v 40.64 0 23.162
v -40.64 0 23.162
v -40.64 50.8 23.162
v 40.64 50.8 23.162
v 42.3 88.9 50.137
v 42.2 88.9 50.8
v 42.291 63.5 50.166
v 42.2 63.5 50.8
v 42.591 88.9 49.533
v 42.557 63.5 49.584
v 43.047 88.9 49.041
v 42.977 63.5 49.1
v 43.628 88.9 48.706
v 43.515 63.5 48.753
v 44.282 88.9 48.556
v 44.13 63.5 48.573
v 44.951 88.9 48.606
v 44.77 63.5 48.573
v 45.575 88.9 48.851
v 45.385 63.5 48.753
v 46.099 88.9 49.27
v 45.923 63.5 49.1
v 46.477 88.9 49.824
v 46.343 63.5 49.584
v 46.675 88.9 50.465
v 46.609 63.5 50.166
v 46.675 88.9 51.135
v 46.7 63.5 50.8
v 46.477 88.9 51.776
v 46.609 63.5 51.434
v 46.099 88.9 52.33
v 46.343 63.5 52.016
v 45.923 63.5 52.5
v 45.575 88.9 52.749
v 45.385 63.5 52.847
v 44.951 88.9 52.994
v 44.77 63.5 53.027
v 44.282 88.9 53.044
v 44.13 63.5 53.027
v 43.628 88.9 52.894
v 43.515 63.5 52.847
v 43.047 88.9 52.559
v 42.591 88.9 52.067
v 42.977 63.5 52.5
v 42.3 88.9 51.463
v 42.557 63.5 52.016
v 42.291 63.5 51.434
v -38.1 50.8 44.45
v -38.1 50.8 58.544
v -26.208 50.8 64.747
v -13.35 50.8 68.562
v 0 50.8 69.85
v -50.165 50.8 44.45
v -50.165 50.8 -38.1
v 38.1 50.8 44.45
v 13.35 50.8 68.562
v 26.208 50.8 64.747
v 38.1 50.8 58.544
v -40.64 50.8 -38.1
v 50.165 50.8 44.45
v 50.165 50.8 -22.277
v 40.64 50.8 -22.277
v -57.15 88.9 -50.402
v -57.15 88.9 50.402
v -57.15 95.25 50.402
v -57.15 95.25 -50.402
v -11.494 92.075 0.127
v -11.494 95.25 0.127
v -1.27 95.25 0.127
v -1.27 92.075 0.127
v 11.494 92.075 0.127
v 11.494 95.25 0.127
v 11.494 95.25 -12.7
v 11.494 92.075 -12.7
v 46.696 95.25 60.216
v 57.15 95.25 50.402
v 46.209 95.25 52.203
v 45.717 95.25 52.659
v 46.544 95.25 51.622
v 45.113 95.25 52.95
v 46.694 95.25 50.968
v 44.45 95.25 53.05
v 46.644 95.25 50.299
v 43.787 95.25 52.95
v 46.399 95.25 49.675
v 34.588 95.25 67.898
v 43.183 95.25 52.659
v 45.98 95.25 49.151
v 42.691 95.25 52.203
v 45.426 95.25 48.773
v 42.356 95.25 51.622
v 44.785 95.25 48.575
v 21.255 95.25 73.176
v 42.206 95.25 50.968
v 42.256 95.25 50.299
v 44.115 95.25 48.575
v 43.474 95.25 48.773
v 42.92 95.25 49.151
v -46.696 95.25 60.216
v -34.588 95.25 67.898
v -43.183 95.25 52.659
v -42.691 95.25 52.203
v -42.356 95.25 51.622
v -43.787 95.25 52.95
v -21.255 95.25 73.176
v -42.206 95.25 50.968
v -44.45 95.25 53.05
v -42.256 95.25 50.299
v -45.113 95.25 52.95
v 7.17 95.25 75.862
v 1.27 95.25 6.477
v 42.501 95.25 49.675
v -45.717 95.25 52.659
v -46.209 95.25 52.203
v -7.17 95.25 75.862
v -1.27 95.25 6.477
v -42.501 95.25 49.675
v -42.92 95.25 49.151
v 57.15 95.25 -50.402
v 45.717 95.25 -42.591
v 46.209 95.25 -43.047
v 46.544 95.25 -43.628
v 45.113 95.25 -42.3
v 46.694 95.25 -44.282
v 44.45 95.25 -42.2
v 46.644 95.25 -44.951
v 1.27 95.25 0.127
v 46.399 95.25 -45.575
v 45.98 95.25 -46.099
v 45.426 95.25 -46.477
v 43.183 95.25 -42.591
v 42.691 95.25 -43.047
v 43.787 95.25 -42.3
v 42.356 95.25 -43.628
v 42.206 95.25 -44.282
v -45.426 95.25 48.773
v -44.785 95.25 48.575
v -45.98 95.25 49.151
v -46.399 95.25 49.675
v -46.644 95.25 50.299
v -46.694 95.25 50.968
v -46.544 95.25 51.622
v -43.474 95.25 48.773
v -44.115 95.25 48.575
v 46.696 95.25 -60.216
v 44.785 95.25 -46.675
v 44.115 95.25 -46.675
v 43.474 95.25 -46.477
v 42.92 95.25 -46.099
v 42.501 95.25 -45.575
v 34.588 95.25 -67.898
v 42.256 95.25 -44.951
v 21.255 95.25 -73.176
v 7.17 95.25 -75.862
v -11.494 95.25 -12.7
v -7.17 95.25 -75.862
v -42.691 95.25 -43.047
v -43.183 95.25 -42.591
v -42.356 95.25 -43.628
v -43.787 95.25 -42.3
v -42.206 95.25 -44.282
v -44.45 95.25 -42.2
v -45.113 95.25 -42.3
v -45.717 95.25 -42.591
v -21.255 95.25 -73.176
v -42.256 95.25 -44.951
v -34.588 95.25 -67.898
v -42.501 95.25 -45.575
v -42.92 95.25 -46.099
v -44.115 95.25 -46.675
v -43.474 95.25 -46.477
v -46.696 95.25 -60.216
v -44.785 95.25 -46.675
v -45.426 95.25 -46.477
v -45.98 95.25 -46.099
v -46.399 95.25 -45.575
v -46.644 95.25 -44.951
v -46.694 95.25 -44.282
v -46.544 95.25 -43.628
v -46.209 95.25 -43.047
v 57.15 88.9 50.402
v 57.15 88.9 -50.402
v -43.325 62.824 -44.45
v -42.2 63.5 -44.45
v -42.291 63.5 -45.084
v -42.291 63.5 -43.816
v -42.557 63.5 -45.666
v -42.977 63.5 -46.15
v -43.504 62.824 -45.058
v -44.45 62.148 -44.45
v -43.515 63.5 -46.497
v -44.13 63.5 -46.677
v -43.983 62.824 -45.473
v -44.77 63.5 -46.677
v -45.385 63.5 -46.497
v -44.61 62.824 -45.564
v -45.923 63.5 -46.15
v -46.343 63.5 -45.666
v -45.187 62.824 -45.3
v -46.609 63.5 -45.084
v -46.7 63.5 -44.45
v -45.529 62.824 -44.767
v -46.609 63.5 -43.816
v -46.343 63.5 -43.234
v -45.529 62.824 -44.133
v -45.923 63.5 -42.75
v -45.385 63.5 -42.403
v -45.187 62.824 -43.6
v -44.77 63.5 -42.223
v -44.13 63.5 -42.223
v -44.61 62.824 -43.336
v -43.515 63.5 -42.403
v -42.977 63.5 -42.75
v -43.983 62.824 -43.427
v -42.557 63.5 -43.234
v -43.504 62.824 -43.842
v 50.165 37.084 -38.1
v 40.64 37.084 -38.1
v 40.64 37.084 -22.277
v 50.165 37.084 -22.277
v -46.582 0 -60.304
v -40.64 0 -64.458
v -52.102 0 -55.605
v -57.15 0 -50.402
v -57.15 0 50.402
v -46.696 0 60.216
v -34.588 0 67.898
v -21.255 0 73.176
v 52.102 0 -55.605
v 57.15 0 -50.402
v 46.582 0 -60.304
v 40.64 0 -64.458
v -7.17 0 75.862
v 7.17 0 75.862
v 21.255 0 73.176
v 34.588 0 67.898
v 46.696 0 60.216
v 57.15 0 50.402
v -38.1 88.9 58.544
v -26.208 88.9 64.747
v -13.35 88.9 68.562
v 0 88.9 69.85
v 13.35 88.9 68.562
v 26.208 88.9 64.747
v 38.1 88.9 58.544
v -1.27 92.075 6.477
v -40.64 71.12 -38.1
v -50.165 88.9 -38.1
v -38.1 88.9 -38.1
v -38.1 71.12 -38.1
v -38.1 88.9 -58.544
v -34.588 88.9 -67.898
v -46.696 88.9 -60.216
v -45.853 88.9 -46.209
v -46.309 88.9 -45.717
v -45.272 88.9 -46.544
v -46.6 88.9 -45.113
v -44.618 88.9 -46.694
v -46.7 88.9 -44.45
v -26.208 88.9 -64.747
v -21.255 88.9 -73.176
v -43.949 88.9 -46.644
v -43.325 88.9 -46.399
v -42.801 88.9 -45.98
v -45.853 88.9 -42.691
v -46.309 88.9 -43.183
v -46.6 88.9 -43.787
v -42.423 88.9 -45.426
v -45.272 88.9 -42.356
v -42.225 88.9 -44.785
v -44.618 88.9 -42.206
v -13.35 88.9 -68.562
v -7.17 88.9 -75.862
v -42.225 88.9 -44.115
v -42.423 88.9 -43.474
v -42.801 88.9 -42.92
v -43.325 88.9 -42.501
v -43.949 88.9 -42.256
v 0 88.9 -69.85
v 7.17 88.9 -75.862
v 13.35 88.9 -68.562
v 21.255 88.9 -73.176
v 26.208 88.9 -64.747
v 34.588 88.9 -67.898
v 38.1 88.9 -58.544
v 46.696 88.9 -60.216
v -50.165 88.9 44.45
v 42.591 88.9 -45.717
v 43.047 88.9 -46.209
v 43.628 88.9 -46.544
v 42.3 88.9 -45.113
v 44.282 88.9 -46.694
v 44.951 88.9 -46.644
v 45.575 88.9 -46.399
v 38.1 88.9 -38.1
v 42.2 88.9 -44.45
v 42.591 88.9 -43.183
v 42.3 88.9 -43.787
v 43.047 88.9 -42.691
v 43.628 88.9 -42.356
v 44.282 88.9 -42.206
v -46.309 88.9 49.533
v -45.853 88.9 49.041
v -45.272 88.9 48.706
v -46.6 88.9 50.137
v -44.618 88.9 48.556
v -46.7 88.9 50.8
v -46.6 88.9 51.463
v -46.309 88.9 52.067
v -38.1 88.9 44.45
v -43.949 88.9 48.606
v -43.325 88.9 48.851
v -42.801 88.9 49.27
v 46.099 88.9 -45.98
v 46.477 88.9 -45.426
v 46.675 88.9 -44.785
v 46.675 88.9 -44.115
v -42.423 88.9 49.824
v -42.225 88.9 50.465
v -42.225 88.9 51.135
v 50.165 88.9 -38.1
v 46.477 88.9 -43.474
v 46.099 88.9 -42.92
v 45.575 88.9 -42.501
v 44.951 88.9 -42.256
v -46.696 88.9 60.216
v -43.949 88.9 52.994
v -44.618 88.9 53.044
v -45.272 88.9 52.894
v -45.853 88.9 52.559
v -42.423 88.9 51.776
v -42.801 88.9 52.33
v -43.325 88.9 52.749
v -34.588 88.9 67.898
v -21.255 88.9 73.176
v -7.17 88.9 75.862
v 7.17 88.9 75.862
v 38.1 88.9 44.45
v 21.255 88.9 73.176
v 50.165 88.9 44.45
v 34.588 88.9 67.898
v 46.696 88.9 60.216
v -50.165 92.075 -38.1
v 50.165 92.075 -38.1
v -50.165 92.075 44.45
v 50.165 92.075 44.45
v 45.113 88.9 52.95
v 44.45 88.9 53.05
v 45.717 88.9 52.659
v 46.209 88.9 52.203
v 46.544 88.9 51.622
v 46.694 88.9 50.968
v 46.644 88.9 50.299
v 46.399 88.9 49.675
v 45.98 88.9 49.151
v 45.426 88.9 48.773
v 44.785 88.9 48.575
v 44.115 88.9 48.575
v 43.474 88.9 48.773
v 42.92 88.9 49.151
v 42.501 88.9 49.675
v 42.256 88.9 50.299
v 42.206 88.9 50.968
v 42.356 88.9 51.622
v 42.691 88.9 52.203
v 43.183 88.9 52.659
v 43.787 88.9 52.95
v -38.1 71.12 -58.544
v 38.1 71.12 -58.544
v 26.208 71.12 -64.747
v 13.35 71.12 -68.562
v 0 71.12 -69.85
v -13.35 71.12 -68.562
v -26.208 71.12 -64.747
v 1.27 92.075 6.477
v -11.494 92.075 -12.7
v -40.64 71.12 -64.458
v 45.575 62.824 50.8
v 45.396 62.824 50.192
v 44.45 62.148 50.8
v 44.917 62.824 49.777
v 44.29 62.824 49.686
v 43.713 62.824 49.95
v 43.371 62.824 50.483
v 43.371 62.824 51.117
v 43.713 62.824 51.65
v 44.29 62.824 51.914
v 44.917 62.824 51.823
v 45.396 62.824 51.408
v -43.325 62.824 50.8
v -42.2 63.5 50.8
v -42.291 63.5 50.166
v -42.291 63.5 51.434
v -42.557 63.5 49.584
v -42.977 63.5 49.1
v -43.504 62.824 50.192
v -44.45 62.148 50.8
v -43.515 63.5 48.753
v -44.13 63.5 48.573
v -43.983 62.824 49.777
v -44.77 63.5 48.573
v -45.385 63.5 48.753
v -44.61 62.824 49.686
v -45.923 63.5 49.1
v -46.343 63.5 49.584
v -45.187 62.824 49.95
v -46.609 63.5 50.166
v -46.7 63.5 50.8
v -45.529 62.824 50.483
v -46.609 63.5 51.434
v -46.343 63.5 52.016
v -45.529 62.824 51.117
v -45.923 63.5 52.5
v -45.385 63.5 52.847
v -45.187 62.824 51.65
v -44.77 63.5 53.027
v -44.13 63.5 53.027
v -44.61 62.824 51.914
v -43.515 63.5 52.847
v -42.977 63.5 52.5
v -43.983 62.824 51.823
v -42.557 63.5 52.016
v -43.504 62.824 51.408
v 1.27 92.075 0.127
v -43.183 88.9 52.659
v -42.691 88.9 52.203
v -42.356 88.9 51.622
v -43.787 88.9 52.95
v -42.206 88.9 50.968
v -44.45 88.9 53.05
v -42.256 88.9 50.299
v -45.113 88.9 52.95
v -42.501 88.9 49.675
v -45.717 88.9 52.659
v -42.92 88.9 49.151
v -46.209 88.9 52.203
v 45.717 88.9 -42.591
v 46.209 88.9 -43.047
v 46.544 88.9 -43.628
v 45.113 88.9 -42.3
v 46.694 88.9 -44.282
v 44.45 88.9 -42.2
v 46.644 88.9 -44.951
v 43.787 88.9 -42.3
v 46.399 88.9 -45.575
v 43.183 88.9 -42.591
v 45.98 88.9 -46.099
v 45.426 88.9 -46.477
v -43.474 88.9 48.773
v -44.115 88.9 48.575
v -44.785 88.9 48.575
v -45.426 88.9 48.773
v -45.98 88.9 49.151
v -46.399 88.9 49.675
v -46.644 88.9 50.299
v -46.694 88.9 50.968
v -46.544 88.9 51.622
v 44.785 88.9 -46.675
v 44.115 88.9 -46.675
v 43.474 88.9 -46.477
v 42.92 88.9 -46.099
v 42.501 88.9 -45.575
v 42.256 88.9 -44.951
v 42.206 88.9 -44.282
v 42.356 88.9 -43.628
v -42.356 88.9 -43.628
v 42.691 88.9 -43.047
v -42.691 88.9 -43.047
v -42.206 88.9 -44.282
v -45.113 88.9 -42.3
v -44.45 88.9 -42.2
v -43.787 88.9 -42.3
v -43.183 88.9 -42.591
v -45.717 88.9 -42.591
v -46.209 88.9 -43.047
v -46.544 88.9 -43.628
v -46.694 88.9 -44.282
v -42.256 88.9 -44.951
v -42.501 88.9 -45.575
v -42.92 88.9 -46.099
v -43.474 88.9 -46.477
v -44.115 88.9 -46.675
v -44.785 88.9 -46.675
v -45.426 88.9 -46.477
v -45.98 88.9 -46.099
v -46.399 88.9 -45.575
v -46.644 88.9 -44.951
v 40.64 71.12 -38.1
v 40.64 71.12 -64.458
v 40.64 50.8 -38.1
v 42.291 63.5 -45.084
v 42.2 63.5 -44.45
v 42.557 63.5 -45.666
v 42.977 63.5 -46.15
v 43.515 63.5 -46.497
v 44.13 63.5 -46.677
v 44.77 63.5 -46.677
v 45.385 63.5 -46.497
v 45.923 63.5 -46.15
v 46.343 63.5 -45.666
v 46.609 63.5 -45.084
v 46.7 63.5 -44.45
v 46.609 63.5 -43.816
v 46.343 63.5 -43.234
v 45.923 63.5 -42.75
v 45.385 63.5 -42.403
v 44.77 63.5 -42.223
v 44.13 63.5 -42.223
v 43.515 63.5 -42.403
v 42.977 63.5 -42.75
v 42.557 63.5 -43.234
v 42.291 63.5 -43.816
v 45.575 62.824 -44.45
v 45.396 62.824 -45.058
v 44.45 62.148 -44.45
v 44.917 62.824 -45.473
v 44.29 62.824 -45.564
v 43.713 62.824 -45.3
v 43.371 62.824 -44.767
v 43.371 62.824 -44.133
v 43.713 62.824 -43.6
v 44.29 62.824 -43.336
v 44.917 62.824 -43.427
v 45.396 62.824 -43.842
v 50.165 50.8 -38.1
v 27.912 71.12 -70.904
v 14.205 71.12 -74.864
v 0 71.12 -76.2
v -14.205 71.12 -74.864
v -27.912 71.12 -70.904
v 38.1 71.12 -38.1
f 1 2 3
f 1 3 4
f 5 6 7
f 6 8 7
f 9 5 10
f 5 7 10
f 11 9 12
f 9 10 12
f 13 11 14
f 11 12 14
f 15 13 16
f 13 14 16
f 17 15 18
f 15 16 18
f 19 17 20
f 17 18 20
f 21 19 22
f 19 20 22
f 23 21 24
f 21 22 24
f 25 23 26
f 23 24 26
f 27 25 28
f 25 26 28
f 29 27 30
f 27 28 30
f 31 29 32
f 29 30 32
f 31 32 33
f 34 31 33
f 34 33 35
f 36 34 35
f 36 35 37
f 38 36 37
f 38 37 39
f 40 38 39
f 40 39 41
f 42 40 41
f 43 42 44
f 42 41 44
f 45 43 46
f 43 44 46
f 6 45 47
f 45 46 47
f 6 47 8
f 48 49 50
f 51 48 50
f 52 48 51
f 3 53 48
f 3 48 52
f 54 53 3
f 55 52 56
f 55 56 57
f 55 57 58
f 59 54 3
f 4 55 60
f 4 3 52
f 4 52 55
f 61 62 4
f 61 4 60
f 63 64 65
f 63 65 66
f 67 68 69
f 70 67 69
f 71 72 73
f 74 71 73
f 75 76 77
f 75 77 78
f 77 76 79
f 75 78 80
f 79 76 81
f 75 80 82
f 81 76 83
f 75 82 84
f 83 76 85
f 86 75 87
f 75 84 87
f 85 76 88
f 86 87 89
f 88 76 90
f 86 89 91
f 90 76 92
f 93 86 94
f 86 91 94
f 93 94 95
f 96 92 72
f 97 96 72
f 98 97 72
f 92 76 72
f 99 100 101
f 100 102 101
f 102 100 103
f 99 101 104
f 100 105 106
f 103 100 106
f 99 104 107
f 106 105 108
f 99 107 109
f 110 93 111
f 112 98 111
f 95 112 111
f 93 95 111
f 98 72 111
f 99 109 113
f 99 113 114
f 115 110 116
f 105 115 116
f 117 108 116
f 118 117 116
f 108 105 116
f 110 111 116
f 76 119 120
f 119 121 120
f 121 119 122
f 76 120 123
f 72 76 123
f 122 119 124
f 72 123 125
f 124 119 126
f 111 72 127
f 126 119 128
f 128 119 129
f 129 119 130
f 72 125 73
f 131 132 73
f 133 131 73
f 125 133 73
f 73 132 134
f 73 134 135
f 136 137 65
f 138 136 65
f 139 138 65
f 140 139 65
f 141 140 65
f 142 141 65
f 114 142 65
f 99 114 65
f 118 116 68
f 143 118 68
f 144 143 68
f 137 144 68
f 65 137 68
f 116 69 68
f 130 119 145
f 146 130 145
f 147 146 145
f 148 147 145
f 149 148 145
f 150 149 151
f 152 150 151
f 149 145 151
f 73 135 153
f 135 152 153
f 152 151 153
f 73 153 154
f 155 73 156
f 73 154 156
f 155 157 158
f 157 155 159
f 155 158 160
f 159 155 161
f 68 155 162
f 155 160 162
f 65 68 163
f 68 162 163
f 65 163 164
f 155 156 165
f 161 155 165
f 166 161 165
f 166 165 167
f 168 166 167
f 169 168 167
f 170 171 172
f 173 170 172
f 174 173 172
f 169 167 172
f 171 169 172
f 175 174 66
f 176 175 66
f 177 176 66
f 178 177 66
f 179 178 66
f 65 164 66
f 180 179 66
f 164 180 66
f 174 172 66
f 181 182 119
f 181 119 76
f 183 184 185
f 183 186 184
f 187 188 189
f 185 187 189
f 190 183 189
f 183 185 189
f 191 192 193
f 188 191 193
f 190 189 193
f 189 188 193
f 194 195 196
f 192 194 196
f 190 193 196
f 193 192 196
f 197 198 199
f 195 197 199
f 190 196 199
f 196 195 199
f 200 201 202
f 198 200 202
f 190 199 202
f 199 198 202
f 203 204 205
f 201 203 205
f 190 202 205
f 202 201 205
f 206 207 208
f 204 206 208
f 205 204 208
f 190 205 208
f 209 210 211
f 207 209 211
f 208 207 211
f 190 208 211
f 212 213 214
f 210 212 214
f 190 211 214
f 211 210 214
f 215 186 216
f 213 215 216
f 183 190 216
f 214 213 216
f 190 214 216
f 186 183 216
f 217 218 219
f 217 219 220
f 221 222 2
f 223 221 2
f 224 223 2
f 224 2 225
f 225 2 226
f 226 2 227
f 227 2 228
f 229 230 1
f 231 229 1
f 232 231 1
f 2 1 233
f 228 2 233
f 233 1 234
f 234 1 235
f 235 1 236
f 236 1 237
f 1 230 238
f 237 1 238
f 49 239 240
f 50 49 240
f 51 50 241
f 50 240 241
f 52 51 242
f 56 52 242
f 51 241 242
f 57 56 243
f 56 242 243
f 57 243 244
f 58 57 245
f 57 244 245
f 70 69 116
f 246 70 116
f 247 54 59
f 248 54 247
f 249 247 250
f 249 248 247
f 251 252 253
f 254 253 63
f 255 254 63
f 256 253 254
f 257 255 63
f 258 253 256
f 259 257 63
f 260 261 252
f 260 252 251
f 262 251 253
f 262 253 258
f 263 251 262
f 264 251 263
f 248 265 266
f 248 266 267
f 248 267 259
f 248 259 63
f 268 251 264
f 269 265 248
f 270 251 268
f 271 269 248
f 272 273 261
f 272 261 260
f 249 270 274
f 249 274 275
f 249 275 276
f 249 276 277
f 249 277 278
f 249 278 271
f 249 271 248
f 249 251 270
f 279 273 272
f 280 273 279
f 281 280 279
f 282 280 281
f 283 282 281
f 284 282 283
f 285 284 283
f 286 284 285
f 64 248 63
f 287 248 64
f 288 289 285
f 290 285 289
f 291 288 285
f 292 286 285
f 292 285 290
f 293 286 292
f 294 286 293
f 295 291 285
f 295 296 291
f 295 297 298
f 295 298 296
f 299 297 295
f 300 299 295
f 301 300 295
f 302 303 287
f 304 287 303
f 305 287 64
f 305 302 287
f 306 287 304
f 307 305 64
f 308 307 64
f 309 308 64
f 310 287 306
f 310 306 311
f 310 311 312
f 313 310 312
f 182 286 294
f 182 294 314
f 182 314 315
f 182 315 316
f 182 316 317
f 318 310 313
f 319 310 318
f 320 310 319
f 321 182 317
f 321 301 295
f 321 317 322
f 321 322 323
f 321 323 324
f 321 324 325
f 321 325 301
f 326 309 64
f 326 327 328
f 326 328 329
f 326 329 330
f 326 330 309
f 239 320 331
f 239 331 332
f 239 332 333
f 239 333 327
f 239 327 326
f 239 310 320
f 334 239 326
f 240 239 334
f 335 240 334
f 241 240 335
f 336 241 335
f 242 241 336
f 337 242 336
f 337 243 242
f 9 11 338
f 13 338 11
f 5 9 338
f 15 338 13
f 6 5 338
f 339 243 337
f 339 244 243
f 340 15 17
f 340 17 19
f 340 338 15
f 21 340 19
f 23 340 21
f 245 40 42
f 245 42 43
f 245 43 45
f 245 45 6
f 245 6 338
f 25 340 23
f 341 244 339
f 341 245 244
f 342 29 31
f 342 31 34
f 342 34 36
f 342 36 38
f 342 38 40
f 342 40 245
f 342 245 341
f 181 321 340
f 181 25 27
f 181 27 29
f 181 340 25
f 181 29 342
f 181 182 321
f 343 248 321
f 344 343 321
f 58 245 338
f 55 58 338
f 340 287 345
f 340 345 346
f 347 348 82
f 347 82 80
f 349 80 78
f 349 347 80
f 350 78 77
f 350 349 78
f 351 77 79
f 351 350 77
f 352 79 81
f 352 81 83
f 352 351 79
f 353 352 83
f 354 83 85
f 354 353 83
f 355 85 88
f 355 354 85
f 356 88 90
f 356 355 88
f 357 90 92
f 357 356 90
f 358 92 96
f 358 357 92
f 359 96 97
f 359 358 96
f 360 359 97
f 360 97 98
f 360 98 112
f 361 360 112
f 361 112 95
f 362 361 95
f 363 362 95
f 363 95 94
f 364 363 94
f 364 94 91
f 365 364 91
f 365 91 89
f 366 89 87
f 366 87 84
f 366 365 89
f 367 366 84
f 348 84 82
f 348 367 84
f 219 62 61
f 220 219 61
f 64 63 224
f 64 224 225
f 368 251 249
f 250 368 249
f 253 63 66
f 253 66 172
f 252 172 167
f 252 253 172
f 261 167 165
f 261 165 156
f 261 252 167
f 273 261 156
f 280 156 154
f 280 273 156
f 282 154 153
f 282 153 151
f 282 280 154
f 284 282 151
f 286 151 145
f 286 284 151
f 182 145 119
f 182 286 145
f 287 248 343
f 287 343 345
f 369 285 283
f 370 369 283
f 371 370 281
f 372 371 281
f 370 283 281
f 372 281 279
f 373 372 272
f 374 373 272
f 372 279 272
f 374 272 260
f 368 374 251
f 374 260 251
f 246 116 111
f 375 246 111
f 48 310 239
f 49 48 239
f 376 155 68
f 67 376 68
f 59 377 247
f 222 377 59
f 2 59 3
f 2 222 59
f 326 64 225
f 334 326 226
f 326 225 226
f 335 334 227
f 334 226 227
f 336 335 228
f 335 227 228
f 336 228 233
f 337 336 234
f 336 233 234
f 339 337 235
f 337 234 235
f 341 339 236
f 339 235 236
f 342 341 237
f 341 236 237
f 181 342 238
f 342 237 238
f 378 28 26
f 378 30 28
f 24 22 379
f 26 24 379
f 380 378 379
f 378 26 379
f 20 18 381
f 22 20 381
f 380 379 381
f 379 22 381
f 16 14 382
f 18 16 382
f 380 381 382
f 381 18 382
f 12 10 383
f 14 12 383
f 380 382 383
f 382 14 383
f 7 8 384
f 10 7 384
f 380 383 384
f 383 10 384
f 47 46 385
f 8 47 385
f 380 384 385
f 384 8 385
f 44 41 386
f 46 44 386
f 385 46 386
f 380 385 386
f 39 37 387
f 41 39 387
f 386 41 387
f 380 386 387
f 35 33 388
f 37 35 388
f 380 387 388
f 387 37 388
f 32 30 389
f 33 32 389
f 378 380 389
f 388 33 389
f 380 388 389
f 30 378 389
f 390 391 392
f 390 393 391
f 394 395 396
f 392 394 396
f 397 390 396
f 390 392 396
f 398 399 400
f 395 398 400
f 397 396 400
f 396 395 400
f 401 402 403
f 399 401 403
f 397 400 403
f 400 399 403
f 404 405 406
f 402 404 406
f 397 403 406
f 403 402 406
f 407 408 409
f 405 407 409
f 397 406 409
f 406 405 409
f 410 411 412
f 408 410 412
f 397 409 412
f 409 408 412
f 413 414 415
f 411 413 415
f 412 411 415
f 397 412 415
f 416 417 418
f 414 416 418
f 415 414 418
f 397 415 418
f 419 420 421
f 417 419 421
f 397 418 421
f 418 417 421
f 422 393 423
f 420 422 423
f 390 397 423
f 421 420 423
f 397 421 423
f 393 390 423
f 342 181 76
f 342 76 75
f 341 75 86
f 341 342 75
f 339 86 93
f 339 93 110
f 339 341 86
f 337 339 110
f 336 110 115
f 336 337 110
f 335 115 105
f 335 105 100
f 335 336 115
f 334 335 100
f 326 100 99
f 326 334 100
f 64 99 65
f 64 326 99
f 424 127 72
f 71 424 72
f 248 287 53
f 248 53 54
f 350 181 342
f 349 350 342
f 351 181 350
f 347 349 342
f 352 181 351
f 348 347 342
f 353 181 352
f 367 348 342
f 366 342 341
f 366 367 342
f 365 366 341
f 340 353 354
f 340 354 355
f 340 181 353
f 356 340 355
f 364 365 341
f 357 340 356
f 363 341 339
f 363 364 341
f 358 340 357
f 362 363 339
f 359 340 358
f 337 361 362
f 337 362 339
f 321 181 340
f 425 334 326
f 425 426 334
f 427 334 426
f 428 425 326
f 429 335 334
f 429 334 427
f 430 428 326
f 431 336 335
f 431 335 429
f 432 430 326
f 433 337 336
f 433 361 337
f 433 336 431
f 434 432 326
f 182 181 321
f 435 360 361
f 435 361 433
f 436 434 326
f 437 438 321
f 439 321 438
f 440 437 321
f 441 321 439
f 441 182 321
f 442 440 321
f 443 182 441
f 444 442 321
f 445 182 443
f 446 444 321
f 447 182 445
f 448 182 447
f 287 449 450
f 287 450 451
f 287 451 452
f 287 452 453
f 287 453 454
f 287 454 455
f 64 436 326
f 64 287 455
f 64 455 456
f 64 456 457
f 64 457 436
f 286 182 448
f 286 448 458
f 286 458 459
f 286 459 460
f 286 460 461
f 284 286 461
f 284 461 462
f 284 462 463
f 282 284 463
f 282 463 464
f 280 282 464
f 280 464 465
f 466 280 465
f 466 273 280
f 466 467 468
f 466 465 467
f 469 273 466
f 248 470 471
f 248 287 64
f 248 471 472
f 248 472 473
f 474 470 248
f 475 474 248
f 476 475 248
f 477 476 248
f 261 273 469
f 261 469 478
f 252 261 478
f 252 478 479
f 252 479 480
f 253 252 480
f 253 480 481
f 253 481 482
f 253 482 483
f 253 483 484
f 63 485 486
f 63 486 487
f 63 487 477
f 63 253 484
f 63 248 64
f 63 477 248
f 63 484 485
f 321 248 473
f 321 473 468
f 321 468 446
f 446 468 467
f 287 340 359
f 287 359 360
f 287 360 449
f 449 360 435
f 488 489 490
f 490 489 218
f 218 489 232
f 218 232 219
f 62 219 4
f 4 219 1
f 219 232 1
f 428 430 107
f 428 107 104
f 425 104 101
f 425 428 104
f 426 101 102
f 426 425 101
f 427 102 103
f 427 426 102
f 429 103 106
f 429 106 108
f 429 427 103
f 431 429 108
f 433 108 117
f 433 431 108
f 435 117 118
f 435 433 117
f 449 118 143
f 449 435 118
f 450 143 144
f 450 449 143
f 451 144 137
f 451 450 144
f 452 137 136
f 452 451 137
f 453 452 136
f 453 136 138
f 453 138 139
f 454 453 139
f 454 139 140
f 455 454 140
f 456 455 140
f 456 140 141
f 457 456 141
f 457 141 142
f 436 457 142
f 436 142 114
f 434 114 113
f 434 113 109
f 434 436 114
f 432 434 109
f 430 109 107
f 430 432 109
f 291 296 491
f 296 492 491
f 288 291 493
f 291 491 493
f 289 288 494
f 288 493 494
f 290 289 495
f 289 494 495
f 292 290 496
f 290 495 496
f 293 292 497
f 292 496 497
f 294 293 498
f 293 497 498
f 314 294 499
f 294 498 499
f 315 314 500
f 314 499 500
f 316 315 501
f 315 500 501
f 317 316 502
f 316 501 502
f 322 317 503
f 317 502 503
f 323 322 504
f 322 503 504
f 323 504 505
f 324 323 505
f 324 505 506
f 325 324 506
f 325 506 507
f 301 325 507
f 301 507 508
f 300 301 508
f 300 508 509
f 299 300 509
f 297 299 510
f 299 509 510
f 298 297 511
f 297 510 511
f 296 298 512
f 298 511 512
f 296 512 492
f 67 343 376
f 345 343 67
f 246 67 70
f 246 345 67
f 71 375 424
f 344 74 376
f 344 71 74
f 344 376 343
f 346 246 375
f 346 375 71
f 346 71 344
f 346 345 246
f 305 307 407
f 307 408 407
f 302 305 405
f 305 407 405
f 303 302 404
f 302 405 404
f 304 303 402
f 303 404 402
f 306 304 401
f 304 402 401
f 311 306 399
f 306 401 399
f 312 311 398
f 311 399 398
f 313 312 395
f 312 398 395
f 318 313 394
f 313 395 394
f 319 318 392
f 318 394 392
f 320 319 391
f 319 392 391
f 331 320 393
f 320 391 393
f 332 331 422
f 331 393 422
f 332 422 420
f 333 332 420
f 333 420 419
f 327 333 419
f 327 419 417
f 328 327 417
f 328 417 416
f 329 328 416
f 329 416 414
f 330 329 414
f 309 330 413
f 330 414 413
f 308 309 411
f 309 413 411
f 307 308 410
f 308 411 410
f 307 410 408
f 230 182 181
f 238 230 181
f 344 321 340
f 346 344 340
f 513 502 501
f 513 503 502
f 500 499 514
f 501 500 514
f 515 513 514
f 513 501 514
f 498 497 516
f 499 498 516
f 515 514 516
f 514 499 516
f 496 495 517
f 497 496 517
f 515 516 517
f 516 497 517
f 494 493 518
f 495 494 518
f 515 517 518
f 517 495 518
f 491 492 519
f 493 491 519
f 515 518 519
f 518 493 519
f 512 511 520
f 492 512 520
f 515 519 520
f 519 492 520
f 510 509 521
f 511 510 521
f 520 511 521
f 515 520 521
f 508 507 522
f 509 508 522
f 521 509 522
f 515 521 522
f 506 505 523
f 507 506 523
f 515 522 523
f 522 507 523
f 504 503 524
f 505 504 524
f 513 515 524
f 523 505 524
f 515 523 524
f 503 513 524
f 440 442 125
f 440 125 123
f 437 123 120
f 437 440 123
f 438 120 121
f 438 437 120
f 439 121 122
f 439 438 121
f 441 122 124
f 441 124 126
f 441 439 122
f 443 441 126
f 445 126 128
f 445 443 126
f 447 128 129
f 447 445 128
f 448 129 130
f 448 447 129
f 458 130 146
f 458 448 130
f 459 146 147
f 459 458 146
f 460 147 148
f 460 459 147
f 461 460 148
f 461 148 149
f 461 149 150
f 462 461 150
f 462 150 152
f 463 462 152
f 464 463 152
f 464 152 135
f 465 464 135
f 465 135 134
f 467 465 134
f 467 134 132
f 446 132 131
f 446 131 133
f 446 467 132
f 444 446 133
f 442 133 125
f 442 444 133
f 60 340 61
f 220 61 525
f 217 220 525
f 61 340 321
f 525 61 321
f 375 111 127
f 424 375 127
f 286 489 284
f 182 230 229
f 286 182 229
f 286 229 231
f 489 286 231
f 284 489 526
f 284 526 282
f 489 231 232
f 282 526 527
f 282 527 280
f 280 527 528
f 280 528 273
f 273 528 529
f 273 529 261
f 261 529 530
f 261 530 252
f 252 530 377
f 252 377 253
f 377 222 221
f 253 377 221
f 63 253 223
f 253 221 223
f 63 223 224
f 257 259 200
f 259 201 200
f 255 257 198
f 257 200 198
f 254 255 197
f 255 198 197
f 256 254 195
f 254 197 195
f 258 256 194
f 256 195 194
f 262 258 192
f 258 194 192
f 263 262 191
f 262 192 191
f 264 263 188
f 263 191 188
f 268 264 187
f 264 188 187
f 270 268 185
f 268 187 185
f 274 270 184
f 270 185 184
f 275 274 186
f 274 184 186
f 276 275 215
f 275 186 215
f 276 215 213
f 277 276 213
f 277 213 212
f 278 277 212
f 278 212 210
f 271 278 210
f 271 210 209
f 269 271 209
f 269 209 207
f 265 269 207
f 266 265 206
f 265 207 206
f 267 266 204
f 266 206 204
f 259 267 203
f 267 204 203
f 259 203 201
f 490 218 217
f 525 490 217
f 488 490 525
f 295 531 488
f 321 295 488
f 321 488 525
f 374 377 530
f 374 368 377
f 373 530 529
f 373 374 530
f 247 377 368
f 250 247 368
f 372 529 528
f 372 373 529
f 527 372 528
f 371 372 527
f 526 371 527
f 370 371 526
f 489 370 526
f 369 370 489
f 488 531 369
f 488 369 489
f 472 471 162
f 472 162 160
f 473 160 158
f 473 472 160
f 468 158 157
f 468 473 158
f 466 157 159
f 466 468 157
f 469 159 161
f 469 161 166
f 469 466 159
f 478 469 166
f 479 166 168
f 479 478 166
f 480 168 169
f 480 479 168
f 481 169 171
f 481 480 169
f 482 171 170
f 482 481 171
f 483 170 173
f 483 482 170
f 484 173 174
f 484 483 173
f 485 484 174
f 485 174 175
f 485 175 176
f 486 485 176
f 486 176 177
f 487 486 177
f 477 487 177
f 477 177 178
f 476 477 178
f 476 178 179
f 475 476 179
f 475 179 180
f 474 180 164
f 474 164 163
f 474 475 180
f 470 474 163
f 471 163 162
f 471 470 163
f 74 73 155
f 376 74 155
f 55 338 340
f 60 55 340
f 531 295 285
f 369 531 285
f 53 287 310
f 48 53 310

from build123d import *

# Parameters (mm, degrees)
SKETCH1_R                = 76.2
BOSS_EXTRUDE1_DEPTH      = 88.9
CUT_EXTRUDE1_DEPTH       = 38.1
SKETCH3_W                = 81.28
SKETCH3_H                = 87.619747847
CUT_EXTRUDE2_DEPTH       = 71.12
CUT_EXTRUDE4_DEPTH       = 140.7
CUT_EXTRUDE6_REACH       = 132.291
SKETCH6_W                = 100.33
SKETCH6_H                = 82.55
SKETCH7_W                = 9.525
SKETCH7_H                = 15.823137595
CUT_EXTRUDE7_DEPTH       = 13.716
M4_CLEARANCE_HOLE1_D     = 4.5
M4_CLEARANCE_HOLE1_DEPTH = 25.4
M4_CLEARANCE_HOLE1_TIP   = 1.351936393
SKETCH11_R               = 2.25
BOSS_EXTRUDE2_DEPTH      = 6.35
CUT_EXTRUDE8_DEPTH       = 13.716
SKETCH13_W               = 100.33
SKETCH13_H               = 82.55
CUT_EXTRUDE9_DEPTH       = 3.175


with BuildPart() as part:
    # Sketch1 → Boss-Extrude1 (new body)
    with BuildSketch(Plane(origin=(0, 0, 0), x_dir=(1, 0, 0), z_dir=(0, 1, 0))):
        with Locations(Location((0, 0, 0), (0, 0, 270))):
            Circle(SKETCH1_R)
    extrude(amount=BOSS_EXTRUDE1_DEPTH)

    # Sketch2 → Cut-Extrude1 (cut)
    with BuildSketch(Plane(origin=(0, 88.9, 0), x_dir=(1, 0, 0), z_dir=(0, 1, 0))):
        with BuildLine():
            Line((38.1, -58.544107304), (38.1, 58.544107304))
            ThreePointArc((38.1, 58.544107304), (0, 69.85), (-38.1, 58.544107304))
            Line((-38.1, 58.544107304), (-38.1, -58.544107304))
            ThreePointArc((-38.1, -58.544107304), (0, -69.85), (38.1, -58.544107304))
        make_face()
    extrude(amount=-CUT_EXTRUDE1_DEPTH, mode=Mode.SUBTRACT)

    # Sketch3 → Cut-Extrude2 (cut)
    with BuildSketch(Plane.XZ):
        with Locations((0, -20.648099982)):
            Rectangle(SKETCH3_W, SKETCH3_H)
        with BuildLine():
            Line((40.64, -64.457973905), (-40.64, -64.457973905))
            ThreePointArc((-40.64, -64.457973905), (0, -76.2), (40.64, -64.457973905))
        make_face()
    extrude(amount=-CUT_EXTRUDE2_DEPTH, mode=Mode.SUBTRACT)

    # Sketch5 → Cut-Extrude4 (cut, through all)
    with BuildSketch(Plane(origin=(0, 88.9, 0), x_dir=(1, 0, 0), z_dir=(0, 1, 0))):
        with BuildLine():
            Line((-57.15, 50.401562476), (-57.15, -50.401562476))
            ThreePointArc((-57.15, -50.401562476), (-76.2, 0), (-57.15, 50.401562476))
        make_face()
        with BuildLine():
            Line((57.15, 50.401562476), (57.15, -50.401562476))
            ThreePointArc((57.15, -50.401562476), (76.2, 0), (57.15, 50.401562476))
        make_face()
    extrude(amount=-CUT_EXTRUDE4_DEPTH, mode=Mode.SUBTRACT)

    # Cut-Extrude6: up to this face of the body (flat: up to its plane)
    cut_extrude6_end = Plane(part.part.faces().sort_by_distance((0, 50.8, 44.815572864))[0])
    # Sketch6 → Cut-Extrude6 (cut, up to the picked face)
    with BuildSketch(Plane(origin=(0, 88.9, 0), x_dir=(1, 0, 0), z_dir=(0, 1, 0)), mode=Mode.PRIVATE) as cut_extrude6_sk1:
        with Locations((0, -3.175)):
            Rectangle(SKETCH6_W, SKETCH6_H)
    cut_extrude6_tool1 = split(extrude(cut_extrude6_sk1.sketch, amount=-CUT_EXTRUDE6_REACH, mode=Mode.PRIVATE), bisect_by=cut_extrude6_end, keep=Keep.BOTH, mode=Mode.PRIVATE)
    add(cut_extrude6_tool1.solids().sort_by(Axis((0, 88.9, 3.175), (0, -1, 0)))[0], mode=Mode.SUBTRACT)

    # Sketch7 → Cut-Extrude7 (cut)
    with BuildSketch(Plane(origin=(0, 50.8, 0), x_dir=(1, 0, 0), z_dir=(0, 1, 0))):
        with Locations((45.4025, 30.188431203)):
            Rectangle(SKETCH7_W, SKETCH7_H)
    extrude(amount=-CUT_EXTRUDE7_DEPTH, mode=Mode.SUBTRACT)

    # M4 Clearance Hole1
    with Locations(Plane(origin=(0, 88.9, 0), x_dir=(1, 0, 0), z_dir=(0, 1, 0))):
        with Locations((44.45, 44.45), (-44.45, 44.45), (-44.45, -50.8), (44.45, -50.8)):
            Hole(M4_CLEARANCE_HOLE1_D / 2, depth=M4_CLEARANCE_HOLE1_DEPTH)
            with Locations((0, 0, -(M4_CLEARANCE_HOLE1_DEPTH + M4_CLEARANCE_HOLE1_TIP / 2))):  # 118° drill point
                Cone(0, M4_CLEARANCE_HOLE1_D / 2, M4_CLEARANCE_HOLE1_TIP, mode=Mode.SUBTRACT)


with BuildPart() as body_2:
    # Sketch11 → Boss-Extrude2 (new body)
    with BuildSketch(Plane(origin=(0, 88.9, 0), x_dir=(1, 0, 0), z_dir=(0, 1, 0))):
        with BuildLine():
            Line((-57.15, -50.401562476), (-57.15, 50.401562476))
            ThreePointArc((-57.15, 50.401562476), (0, 76.2), (57.15, 50.401562476))
            Line((57.15, 50.401562476), (57.15, -50.401562476))
            ThreePointArc((57.15, -50.401562476), (0, -76.2), (-57.15, -50.401562476))
        make_face()
        with Locations(Location((-44.45, -50.8, 0), (0, 0, 270))):
            Circle(SKETCH11_R, mode=Mode.SUBTRACT)
        with Locations(Location((-44.45, 44.45, 0), (0, 0, 270))):
            Circle(SKETCH11_R, mode=Mode.SUBTRACT)
        with Locations(Location((44.45, 44.45, 0), (0, 0, 270))):
            Circle(SKETCH11_R, mode=Mode.SUBTRACT)
        with Locations(Location((44.45, -50.8, 0), (0, 0, 270))):
            Circle(SKETCH11_R, mode=Mode.SUBTRACT)
    extrude(amount=BOSS_EXTRUDE2_DEPTH)

    # Sketch12 → Cut-Extrude8 (cut)
    with BuildSketch(Plane(origin=(0, 95.25, 0), x_dir=(1, 0, 0), z_dir=(0, 1, 0))):
        Polygon((-11.4935, 12.7), (-11.4935, -0.127), (-1.27, -0.127), (-1.27, -6.477), (1.27, -6.477), (1.27, -0.127), (11.4935, -0.127), (11.4935, 12.7), align=None)
    extrude(amount=-CUT_EXTRUDE8_DEPTH, mode=Mode.SUBTRACT)

    # Sketch13 → Cut-Extrude9 (cut)
    with BuildSketch(Plane.XZ.offset(-88.9)):
        with Locations((0, 3.175)):
            Rectangle(SKETCH13_W, SKETCH13_H)
    extrude(amount=-CUT_EXTRUDE9_DEPTH, mode=Mode.SUBTRACT)


solid = Compound([part.part, body_2.part])
